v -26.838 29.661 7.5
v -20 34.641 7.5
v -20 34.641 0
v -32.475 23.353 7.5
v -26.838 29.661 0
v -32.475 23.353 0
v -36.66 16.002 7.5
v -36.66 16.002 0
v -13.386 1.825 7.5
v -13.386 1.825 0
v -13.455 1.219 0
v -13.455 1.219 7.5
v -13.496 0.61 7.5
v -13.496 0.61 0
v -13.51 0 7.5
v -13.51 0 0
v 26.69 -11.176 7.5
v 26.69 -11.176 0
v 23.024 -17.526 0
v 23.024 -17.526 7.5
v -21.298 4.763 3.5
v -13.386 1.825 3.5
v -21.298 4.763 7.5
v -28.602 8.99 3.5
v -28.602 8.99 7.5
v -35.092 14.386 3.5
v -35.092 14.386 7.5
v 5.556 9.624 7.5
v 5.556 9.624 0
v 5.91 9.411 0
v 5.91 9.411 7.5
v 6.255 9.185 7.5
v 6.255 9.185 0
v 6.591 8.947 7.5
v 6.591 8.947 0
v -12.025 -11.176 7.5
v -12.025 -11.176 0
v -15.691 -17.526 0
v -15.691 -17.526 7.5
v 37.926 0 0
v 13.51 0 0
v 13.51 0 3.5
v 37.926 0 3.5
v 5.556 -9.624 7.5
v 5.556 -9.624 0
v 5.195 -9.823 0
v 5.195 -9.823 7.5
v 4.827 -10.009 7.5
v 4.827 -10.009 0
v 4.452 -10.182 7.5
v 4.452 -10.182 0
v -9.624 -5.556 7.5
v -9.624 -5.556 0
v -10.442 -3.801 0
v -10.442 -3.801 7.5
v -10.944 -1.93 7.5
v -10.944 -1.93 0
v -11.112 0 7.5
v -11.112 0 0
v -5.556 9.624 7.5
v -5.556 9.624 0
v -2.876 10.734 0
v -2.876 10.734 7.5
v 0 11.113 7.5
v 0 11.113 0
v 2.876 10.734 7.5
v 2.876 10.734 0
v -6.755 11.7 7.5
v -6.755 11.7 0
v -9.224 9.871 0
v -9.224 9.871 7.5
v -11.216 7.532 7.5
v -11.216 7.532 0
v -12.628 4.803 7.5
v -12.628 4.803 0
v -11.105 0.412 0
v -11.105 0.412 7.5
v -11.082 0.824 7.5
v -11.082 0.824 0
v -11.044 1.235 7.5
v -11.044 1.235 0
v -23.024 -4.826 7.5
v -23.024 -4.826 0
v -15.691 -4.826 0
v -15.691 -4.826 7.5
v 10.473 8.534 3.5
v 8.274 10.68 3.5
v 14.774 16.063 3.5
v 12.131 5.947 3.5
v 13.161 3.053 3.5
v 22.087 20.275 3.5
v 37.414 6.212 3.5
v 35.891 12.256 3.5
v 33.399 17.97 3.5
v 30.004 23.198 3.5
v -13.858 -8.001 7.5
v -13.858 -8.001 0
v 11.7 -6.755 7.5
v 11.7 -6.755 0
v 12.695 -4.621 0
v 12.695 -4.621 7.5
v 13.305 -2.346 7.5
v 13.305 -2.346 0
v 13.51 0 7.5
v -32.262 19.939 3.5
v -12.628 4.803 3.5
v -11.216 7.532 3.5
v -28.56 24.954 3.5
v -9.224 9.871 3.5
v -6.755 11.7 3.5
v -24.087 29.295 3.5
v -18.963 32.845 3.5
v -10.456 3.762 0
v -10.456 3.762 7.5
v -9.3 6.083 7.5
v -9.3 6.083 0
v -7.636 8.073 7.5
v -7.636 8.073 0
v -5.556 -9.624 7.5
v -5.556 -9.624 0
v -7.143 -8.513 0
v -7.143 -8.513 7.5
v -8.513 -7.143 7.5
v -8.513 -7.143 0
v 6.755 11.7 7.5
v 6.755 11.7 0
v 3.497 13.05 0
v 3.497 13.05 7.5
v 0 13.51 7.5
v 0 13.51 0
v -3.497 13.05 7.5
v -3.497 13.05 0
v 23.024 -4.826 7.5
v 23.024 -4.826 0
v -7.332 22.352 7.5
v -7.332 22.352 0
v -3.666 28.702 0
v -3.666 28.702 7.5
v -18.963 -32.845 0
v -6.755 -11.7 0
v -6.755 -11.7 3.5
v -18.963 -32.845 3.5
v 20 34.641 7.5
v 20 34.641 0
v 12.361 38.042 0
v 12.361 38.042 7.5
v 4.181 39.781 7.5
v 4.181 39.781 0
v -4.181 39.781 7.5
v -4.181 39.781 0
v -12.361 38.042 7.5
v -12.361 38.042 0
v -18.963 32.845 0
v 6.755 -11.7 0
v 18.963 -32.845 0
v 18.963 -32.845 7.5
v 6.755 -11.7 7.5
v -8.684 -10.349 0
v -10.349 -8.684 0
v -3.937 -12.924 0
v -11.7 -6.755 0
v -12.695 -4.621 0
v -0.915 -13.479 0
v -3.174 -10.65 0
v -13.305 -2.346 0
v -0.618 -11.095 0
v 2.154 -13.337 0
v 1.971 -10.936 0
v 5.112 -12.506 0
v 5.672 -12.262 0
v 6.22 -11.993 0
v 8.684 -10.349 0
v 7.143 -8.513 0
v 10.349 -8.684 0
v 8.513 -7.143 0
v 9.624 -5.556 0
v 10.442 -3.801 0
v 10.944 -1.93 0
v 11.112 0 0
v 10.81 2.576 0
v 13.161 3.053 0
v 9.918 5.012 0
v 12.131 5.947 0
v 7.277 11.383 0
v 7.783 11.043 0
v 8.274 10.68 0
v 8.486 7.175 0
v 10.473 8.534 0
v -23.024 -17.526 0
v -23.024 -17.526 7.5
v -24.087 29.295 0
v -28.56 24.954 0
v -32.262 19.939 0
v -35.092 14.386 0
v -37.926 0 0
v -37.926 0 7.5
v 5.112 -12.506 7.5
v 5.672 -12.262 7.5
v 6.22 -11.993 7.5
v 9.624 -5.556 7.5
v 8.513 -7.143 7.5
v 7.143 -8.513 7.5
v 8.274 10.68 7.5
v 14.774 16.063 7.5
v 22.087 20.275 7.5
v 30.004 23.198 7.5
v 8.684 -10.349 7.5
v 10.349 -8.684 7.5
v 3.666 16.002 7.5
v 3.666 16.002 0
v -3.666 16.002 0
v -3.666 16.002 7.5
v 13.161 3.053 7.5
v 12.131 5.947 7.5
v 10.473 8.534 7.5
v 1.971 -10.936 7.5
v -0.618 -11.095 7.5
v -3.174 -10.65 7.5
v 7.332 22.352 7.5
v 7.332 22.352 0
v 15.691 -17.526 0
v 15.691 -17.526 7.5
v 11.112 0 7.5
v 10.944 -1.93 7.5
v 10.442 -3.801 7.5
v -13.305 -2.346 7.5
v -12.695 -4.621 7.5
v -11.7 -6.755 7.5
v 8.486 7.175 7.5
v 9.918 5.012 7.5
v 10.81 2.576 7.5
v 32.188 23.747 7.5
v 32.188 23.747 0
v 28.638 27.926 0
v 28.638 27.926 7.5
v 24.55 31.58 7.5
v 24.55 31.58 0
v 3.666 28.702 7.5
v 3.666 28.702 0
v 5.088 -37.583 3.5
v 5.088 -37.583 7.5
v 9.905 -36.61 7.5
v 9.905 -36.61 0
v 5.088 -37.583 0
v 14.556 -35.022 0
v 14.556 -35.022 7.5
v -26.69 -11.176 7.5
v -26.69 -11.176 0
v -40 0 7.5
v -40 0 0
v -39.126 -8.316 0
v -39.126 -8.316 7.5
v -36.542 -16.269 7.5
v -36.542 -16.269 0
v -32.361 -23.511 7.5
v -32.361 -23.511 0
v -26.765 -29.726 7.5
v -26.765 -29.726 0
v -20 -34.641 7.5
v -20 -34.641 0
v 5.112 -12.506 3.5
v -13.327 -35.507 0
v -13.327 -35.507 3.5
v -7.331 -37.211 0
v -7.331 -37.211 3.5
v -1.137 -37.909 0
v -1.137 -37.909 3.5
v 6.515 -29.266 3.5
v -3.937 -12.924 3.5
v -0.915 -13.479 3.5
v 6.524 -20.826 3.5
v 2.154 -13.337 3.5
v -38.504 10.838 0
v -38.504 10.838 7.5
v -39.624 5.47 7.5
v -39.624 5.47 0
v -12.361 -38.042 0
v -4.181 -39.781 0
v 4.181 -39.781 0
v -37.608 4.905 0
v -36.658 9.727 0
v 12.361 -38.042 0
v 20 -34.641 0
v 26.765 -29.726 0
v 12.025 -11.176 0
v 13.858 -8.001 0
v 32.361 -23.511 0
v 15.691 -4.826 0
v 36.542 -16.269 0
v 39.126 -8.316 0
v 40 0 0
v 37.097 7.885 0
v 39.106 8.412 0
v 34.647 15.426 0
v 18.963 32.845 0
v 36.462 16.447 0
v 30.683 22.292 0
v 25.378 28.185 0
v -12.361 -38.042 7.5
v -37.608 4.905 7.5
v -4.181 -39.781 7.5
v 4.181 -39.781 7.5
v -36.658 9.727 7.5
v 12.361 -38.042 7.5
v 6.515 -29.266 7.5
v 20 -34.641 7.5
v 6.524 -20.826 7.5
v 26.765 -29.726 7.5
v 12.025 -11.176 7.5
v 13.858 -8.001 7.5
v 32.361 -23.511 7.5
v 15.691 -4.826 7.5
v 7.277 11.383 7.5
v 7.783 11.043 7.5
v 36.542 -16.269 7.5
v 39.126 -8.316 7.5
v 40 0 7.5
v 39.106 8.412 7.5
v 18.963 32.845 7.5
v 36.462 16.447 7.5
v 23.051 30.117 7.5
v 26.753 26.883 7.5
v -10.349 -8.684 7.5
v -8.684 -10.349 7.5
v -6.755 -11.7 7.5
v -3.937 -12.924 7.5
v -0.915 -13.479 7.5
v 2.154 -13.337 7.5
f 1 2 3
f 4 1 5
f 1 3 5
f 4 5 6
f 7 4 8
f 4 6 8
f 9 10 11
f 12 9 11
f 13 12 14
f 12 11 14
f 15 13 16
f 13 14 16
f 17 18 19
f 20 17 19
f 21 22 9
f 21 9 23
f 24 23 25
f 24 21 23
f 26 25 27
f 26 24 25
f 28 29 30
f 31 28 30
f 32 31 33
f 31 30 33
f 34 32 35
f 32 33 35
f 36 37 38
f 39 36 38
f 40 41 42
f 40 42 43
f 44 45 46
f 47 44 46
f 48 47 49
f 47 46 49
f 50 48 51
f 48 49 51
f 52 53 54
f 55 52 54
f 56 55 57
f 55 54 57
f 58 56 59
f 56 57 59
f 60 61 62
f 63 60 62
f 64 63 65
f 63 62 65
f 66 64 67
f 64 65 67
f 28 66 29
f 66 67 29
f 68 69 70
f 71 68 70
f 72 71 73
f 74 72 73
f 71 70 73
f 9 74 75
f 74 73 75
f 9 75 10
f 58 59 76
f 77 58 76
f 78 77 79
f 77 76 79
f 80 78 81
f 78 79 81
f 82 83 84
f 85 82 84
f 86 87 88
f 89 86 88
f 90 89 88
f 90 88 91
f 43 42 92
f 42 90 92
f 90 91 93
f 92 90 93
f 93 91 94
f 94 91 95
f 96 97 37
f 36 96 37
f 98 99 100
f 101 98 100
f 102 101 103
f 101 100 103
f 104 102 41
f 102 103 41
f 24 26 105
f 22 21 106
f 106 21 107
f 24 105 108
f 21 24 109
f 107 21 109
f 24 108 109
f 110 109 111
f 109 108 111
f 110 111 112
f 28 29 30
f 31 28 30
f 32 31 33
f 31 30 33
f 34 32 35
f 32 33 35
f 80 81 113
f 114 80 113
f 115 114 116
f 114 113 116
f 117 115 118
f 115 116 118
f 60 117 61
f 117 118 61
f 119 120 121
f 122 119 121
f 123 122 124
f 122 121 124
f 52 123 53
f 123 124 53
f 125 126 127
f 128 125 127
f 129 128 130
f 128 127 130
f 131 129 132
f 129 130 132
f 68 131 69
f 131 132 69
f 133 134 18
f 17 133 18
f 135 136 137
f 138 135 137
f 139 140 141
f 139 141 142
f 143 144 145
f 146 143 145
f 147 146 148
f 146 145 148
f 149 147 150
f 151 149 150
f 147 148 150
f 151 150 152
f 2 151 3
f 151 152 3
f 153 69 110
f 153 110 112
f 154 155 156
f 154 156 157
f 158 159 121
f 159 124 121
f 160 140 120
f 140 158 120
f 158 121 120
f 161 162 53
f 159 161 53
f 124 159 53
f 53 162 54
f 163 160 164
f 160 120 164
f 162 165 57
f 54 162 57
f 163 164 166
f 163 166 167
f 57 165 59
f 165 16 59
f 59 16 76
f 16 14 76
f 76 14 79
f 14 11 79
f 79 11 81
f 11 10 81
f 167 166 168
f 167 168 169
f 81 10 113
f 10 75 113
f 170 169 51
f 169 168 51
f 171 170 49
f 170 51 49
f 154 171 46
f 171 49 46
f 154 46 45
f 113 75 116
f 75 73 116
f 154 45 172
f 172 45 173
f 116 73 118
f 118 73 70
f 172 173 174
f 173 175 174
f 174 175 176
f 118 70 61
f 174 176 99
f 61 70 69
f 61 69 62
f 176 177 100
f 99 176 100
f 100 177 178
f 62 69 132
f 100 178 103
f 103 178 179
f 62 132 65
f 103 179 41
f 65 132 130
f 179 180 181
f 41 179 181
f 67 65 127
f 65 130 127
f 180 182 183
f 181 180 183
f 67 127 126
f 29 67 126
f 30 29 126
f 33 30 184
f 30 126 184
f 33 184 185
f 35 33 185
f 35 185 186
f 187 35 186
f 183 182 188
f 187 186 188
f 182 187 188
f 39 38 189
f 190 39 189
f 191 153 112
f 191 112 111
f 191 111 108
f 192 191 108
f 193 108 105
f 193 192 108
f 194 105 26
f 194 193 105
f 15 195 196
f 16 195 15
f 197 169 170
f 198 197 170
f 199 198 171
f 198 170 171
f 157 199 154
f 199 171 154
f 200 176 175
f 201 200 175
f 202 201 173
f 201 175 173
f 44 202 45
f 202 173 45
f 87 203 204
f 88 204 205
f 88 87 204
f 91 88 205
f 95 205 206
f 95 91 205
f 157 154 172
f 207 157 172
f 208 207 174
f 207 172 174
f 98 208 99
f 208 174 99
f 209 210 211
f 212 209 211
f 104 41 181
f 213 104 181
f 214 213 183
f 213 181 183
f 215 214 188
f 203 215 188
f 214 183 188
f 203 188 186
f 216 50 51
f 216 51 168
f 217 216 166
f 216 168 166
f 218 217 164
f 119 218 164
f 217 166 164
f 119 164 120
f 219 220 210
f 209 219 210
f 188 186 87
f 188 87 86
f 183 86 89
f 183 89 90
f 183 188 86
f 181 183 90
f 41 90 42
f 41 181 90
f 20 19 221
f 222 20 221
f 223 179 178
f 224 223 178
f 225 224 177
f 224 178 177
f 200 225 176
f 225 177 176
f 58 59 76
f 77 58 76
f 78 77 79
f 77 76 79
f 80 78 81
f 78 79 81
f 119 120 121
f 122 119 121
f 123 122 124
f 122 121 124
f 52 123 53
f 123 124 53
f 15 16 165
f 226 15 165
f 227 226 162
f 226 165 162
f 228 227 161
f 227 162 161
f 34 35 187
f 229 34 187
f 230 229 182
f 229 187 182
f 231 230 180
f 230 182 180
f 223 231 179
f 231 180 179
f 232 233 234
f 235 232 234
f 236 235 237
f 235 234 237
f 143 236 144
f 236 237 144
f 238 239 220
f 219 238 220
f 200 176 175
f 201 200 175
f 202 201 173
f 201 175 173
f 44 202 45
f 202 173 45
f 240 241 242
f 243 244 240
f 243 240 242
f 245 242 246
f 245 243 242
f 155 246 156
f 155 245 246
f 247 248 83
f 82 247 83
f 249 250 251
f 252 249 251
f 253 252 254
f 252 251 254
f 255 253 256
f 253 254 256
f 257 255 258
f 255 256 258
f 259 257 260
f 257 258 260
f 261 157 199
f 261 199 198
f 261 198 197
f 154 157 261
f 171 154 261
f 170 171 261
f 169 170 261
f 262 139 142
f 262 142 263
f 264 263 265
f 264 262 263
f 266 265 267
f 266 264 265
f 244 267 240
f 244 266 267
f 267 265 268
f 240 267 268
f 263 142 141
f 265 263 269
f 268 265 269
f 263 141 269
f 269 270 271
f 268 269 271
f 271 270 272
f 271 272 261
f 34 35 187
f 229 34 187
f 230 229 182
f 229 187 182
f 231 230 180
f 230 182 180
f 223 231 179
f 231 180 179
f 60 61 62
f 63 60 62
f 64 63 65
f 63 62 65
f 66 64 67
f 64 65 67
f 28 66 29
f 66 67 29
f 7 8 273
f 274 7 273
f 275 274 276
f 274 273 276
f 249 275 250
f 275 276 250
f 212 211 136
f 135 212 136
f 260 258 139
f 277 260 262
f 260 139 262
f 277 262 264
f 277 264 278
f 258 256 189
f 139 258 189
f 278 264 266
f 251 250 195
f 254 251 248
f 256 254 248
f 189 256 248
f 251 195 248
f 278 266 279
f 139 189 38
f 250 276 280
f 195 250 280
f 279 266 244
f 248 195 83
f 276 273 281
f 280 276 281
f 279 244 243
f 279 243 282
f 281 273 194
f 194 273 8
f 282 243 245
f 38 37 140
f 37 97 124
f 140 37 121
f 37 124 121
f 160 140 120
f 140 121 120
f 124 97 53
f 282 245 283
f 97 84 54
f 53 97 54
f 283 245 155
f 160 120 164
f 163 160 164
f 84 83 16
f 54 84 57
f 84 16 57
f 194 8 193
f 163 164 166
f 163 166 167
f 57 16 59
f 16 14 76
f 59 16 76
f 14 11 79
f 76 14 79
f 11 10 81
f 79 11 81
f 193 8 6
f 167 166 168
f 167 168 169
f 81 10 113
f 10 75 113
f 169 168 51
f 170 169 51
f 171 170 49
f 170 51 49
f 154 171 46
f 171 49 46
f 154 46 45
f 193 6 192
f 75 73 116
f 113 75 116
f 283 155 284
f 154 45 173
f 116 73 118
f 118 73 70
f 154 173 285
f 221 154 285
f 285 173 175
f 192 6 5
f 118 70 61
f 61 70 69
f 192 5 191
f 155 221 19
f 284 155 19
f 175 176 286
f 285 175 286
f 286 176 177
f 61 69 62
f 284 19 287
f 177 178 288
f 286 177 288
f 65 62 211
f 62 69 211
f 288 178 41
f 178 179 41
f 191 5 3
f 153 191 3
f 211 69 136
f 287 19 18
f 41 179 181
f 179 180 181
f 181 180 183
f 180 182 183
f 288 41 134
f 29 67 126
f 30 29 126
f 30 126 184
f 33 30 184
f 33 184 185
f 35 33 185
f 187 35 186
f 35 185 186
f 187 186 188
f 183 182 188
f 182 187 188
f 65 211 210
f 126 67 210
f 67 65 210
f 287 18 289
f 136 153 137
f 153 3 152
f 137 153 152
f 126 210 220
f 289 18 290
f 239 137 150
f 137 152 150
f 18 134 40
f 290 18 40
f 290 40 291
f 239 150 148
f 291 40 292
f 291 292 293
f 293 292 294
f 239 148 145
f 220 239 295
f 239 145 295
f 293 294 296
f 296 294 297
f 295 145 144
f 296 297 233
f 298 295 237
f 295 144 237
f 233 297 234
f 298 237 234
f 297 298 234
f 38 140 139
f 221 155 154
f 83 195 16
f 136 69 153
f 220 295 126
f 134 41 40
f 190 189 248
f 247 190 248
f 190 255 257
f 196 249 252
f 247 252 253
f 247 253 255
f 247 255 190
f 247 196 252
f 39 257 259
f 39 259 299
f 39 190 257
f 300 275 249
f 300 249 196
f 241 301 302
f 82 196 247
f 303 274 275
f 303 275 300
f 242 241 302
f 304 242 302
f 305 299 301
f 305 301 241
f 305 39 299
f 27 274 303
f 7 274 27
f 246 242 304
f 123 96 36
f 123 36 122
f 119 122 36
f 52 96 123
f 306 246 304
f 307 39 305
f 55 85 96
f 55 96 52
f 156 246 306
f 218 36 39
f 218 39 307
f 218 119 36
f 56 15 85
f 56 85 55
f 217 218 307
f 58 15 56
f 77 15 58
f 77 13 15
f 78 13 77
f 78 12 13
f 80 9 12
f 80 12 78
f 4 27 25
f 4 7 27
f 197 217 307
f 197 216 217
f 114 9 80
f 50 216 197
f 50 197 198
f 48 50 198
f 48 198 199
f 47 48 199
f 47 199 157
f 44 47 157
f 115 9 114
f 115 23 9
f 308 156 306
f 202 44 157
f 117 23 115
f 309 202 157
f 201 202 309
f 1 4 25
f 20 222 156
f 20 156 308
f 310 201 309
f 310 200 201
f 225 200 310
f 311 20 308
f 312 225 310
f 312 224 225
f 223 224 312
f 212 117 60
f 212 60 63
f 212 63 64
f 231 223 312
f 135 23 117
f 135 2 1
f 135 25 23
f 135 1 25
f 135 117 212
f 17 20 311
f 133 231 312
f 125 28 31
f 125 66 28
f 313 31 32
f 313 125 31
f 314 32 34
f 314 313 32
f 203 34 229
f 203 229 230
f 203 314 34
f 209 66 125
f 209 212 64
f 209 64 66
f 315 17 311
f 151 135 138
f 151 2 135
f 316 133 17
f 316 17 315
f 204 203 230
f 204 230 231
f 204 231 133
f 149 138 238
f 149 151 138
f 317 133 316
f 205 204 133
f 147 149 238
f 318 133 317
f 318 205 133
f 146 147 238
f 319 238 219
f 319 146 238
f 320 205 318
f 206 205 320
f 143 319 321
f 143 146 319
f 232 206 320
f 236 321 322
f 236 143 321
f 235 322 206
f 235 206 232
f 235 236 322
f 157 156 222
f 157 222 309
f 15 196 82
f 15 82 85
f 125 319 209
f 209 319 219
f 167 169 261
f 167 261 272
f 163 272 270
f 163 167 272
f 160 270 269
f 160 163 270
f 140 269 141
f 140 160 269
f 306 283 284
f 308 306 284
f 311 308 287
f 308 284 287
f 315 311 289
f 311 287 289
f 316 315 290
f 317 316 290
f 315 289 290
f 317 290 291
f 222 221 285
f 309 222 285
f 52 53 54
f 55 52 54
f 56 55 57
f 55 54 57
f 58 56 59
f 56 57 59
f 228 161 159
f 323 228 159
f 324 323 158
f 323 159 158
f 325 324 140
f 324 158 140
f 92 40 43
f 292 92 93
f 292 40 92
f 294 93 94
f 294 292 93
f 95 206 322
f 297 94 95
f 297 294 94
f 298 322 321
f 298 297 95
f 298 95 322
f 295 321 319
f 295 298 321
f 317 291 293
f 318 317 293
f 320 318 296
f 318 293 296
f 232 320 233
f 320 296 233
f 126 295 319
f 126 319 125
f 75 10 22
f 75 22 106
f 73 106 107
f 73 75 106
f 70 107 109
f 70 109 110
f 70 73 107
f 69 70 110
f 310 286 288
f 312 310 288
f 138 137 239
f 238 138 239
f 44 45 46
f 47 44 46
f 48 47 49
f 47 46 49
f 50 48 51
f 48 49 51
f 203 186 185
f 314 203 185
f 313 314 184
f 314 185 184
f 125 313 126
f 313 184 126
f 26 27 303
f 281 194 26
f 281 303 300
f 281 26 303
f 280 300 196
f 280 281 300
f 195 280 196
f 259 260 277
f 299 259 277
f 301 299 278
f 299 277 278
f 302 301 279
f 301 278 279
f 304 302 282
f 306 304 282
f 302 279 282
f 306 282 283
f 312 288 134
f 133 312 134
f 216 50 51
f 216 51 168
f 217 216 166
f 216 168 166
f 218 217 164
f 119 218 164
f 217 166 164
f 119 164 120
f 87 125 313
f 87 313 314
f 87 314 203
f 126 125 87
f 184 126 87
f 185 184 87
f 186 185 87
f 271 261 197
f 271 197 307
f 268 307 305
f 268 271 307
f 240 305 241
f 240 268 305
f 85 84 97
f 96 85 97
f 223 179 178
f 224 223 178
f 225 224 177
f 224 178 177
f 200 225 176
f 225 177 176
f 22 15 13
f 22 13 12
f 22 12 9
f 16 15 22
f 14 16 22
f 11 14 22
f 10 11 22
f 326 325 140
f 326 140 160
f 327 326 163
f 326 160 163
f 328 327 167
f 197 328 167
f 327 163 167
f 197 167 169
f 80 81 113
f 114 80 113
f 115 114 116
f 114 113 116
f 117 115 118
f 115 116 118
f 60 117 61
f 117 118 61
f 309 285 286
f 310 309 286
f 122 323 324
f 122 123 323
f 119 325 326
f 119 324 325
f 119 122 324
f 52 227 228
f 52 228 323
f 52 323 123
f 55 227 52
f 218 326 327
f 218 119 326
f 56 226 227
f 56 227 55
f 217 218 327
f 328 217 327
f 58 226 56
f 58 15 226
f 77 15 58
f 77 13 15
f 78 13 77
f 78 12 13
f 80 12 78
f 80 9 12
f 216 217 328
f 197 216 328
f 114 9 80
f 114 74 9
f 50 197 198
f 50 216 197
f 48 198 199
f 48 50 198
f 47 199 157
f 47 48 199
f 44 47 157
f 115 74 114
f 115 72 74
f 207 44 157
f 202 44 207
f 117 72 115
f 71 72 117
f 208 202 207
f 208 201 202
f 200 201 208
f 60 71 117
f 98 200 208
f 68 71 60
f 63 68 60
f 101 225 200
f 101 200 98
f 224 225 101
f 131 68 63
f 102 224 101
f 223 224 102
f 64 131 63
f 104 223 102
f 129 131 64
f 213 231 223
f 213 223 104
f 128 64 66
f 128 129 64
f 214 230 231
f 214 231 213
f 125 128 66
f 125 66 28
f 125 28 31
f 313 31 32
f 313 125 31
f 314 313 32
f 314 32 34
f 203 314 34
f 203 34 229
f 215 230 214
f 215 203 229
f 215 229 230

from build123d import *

# Parameters (mm, degrees)
F1_DEPTH = 7.5
F2_DEPTH = 3.25
F3_DEPTH = 25
F4_DEPTH = 7.5
F5_DEPTH = 7.5
F6_DEPTH = 25
F7_DEPTH = 3.5


with BuildPart() as f1:
    # F0 (on Top) → F1 (new body)
    with BuildSketch(Plane.XY):
        with BuildLine():
            Line((37.9261646969, 0), (40, 0))
            ThreePointArc((40, 0), (37.9968389168, 12.4996092872), (32.1879883833, 23.7472820305))
            ThreePointArc((32.1879883833, 23.7472820305), (31.0930850061, 23.4847690882), (30.0043711026, 23.1976654721))
            ThreePointArc((30.0043711026, 23.1976654721), (35.8911179032, 12.2564931476), (37.9261646969, 0))
        make_face()
        with BuildLine():
            ThreePointArc((20, -34.6410161514), (34.6410161514, -20), (40, 0))
            Line((40, 0), (37.9261646969, 0))
            ThreePointArc((37.9261646969, 0), (32.8450220956, -18.9630823485), (18.9630823485, -32.8450220956))
            Line((18.9630823485, -32.8450220956), (20, -34.6410161514))
        make_face()
        with BuildLine():
            ThreePointArc((30.0043711026, 23.1976654721), (31.0930850061, 23.4847690882), (32.1879883833, 23.7472820305))
            ThreePointArc((32.1879883833, 23.7472820305), (26.6564231218, 29.8233986385), (20, 34.6410161514))
            Line((20, 34.6410161514), (18.9630823485, 32.8450220956))
            ThreePointArc((18.9630823485, 32.8450220956), (24.9543733006, 28.5599933787), (30.0043711026, 23.1976654721))
        make_face()
        with BuildLine():
            ThreePointArc((4.4717553176, -39.7492566519), (12.4996092872, -37.9968389168), (20, -34.6410161514))
            Line((20, -34.6410161514), (18.9630823485, -32.8450220956))
            ThreePointArc((18.9630823485, -32.8450220956), (12.2564931476, -35.8911179032), (5.087582056, -37.5833803355))
            ThreePointArc((5.087582056, -37.5833803355), (4.7918641293, -38.6697860415), (4.4717553176, -39.7492566519))
        make_face()
        with BuildLine():
            Line((18.9630823485, 32.8450220956), (20, 34.6410161514))
            ThreePointArc((20, 34.6410161514), (0, 40), (-20, 34.6410161514))
            Line((-20, 34.6410161514), (-18.9630823485, 32.8450220956))
            ThreePointArc((-18.9630823485, 32.8450220956), (0, 37.9261646969), (18.9630823485, 32.8450220956))
        make_face()
        with BuildLine():
            ThreePointArc((-20, -34.6410161514), (-8.1734402782, -39.156032409), (4.4717553176, -39.7492566519))
            ThreePointArc((4.4717553176, -39.7492566519), (4.7918641293, -38.6697860415), (5.087582056, -37.5833803355))
            ThreePointArc((5.087582056, -37.5833803355), (-7.3311245245, -37.2108664482), (-18.9630823485, -32.8450220956))
            Line((-18.9630823485, -32.8450220956), (-20, -34.6410161514))
        make_face()
        with BuildLine():
            Line((-18.9630823485, 32.8450220956), (-20, 34.6410161514))
            ThreePointArc((-20, 34.6410161514), (-29.8233986385, 26.6564231218), (-36.6597437009, 16.0019746214))
            ThreePointArc((-36.6597437009, 16.0019746214), (-35.8849491355, 15.1850169532), (-35.0919531586, 14.3857148634))
            ThreePointArc((-35.0919531586, 14.3857148634), (-28.5599933787, 24.9543733006), (-18.9630823485, 32.8450220956))
        make_face()
        with BuildLine():
            ThreePointArc((-40, 0), (-34.6410161514, -20), (-20, -34.6410161514))
            Line((-20, -34.6410161514), (-18.9630823485, -32.8450220956))
            ThreePointArc((-18.9630823485, -32.8450220956), (-32.8450220956, -18.9630823485), (-37.9261646969, 0))
            Line((-37.9261646969, 0), (-40, 0))
        make_face()
        with BuildLine():
            ThreePointArc((-35.0919531586, 14.3857148634), (-35.8849491355, 15.1850169532), (-36.6597437009, 16.0019746214))
            ThreePointArc((-36.6597437009, 16.0019746214), (-39.156032409, 8.1734402782), (-40, 0))
            Line((-40, 0), (-37.9261646969, 0))
            ThreePointArc((-37.9261646969, 0), (-37.2108664482, 7.3311245245), (-35.0919531586, 14.3857148634))
        make_face()
        with BuildLine():
            ThreePointArc((-37.9261646969, 0), (-32.8450220956, -18.9630823485), (-18.9630823485, -32.8450220956))
            Line((-18.9630823485, -32.8450220956), (-6.7550944326, -11.7001667673))
            ThreePointArc((-6.7550944326, -11.7001667673), (-9.5531461618, -9.5531461618), (-11.7001667673, -6.7550944326))
            ThreePointArc((-11.7001667673, -6.7550944326), (-13.049840343, -3.4966941813), (-13.5101888653, 0))
            Line((-13.5101888653, 0), (-37.9261646969, 0))
        make_face()
        Polygon((-15.6912036375, -4.8259873107), (-13.8581165329, -8.0009873107), (-12.0250294282, -11.1759873107), (-15.6912036375, -17.5259873107), (-23.0235520562, -17.5259873107), (-26.6897262656, -11.1759873107), (-23.0235520562, -4.8259873107), align=None, mode=Mode.SUBTRACT)
        with BuildLine():
            ThreePointArc((-18.9630823485, -32.8450220956), (-7.3311245245, -37.2108664482), (5.087582056, -37.5833803355))
            ThreePointArc((5.087582056, -37.5833803355), (6.6978790363, -25.0460653274), (5.112236707, -12.505608303))
            ThreePointArc((5.112236707, -12.505608303), (-0.9148384522, -13.4791792696), (-6.7550944326, -11.7001667673))
            Line((-6.7550944326, -11.7001667673), (-18.9630823485, -32.8450220956))
        make_face()
        with BuildLine():
            ThreePointArc((5.087582056, -37.5833803355), (12.2564931476, -35.8911179032), (18.9630823485, -32.8450220956))
            Line((18.9630823485, -32.8450220956), (6.7550944326, -11.7001667673))
            ThreePointArc((6.7550944326, -11.7001667673), (5.9473162949, -12.1307308957), (5.112236707, -12.505608303))
            ThreePointArc((5.112236707, -12.505608303), (6.6978790363, -25.0460653274), (5.087582056, -37.5833803355))
        make_face()
        with BuildLine():
            ThreePointArc((18.9630823485, -32.8450220956), (32.8450220956, -18.9630823485), (37.9261646969, 0))
            Line((37.9261646969, 0), (13.5101888653, 0))
            ThreePointArc((13.5101888653, 0), (13.049840343, -3.4966941813), (11.7001667673, -6.7550944326))
            ThreePointArc((11.7001667673, -6.7550944326), (9.5531461618, -9.5531461618), (6.7550944326, -11.7001667673))
            Line((6.7550944326, -11.7001667673), (18.9630823485, -32.8450220956))
        make_face()
        Polygon((12.0250294282, -11.1759873107), (13.8581165329, -8.0009873107), (15.6912036375, -4.8259873107), (23.0235520562, -4.8259873107), (26.6897262656, -11.1759873107), (23.0235520562, -17.5259873107), (15.6912036375, -17.5259873107), align=None, mode=Mode.SUBTRACT)
        with BuildLine():
            ThreePointArc((-11.7001667673, -6.7550944326), (-9.5531461618, -9.5531461618), (-6.7550944326, -11.7001667673))
            Line((-6.7550944326, -11.7001667673), (-5.55625, -9.6237072996))
            ThreePointArc((-5.55625, -9.6237072996), (-7.8577241059, -7.8577241059), (-9.6237072996, -5.55625))
            Line((-9.6237072996, -5.55625), (-11.7001667673, -6.7550944326))
        make_face()
        with BuildLine():
            ThreePointArc((-9.6237072996, -5.55625), (-10.7338507446, -2.8761266387), (-11.1125, 0))
            Line((-11.1125, 0), (-13.5101888653, 0))
            ThreePointArc((-13.5101888653, 0), (-13.049840343, -3.4966941813), (-11.7001667673, -6.7550944326))
            Line((-11.7001667673, -6.7550944326), (-9.6237072996, -5.55625))
        make_face()
        with BuildLine():
            Line((-5.55625, 9.6237072996), (-6.7550944326, 11.7001667673))
            ThreePointArc((-6.7550944326, 11.7001667673), (-11.2158924436, 7.5318629748), (-13.3862928336, 1.8254772931))
            ThreePointArc((-13.3862928336, 1.8254772931), (-12.2185420326, 1.5161003824), (-11.0436569899, 1.2350289634))
            ThreePointArc((-11.0436569899, 1.2350289634), (-9.2995542407, 6.0832513654), (-5.55625, 9.6237072996))
        make_face()
        with BuildLine():
            ThreePointArc((-13.3862928336, 1.8254772931), (-25.0394683565, 6.7224992667), (-35.0919531586, 14.3857148634))
            ThreePointArc((-35.0919531586, 14.3857148634), (-37.2108664482, 7.3311245245), (-37.9261646969, 0))
            Line((-37.9261646969, 0), (-13.5101888653, 0))
            ThreePointArc((-13.5101888653, 0), (-13.4791792696, 0.9148384522), (-13.3862928336, 1.8254772931))
        make_face()
        with BuildLine():
            Line((-6.7550944326, 11.7001667673), (-18.9630823485, 32.8450220956))
            ThreePointArc((-18.9630823485, 32.8450220956), (-28.5599933787, 24.9543733006), (-35.0919531586, 14.3857148634))
            ThreePointArc((-35.0919531586, 14.3857148634), (-25.0394683565, 6.7224992667), (-13.3862928336, 1.8254772931))
            ThreePointArc((-13.3862928336, 1.8254772931), (-11.2158924436, 7.5318629748), (-6.7550944326, 11.7001667673))
        make_face()
        with BuildLine():
            Line((6.7550944326, 11.7001667673), (18.9630823485, 32.8450220956))
            ThreePointArc((18.9630823485, 32.8450220956), (0, 37.9261646969), (-18.9630823485, 32.8450220956))
            Line((-18.9630823485, 32.8450220956), (-6.7550944326, 11.7001667673))
            ThreePointArc((-6.7550944326, 11.7001667673), (0, 13.5101888653), (6.7550944326, 11.7001667673))
        make_face()
        Polygon((7.3323484187, 22.3519746214), (3.6661742094, 16.0019746214), (-3.6661742094, 16.0019746214), (-7.3323484187, 22.3519746214), (-3.6661742094, 28.7019746214), (3.6661742094, 28.7019746214), align=None, mode=Mode.SUBTRACT)
        with BuildLine():
            Line((5.55625, 9.6237072996), (6.7550944326, 11.7001667673))
            ThreePointArc((6.7550944326, 11.7001667673), (0, 13.5101888653), (-6.7550944326, 11.7001667673))
            Line((-6.7550944326, 11.7001667673), (-5.55625, 9.6237072996))
            ThreePointArc((-5.55625, 9.6237072996), (0, 11.1125), (5.55625, 9.6237072996))
        make_face()
        with BuildLine():
            Line((-13.5101888653, 0), (-11.1125, 0))
            ThreePointArc((-11.1125, 0), (-11.095275899, 0.6184730997), (-11.0436569899, 1.2350289634))
            ThreePointArc((-11.0436569899, 1.2350289634), (-12.2185420326, 1.5161003824), (-13.3862928336, 1.8254772931))
            ThreePointArc((-13.3862928336, 1.8254772931), (-13.4791792696, 0.9148384522), (-13.5101888653, 0))
        make_face()
        with BuildLine():
            Line((11.1125, 0), (13.5101888653, 0))
            ThreePointArc((13.5101888653, 0), (12.1307308957, 5.9473162949), (8.2740561267, 10.6801310099))
            ThreePointArc((8.2740561267, 10.6801310099), (7.4222524621, 9.8235176062), (6.5913949516, 8.9465730222))
            ThreePointArc((6.5913949516, 8.9465730222), (9.9180273404, 5.0120245336), (11.1125, 0))
        make_face()
        with BuildLine():
            ThreePointArc((6.5913949516, 8.9465730222), (7.4222524621, 9.8235176062), (8.2740561267, 10.6801310099))
            ThreePointArc((8.2740561267, 10.6801310099), (7.5318629748, 11.2158924436), (6.7550944326, 11.7001667673))
            Line((6.7550944326, 11.7001667673), (5.55625, 9.6237072996))
            ThreePointArc((5.55625, 9.6237072996), (6.0832513654, 9.2995542407), (6.5913949516, 8.9465730222))
        make_face()
        with BuildLine():
            Line((5.55625, -9.6237072996), (6.7550944326, -11.7001667673))
            ThreePointArc((6.7550944326, -11.7001667673), (9.5531461618, -9.5531461618), (11.7001667673, -6.7550944326))
            Line((11.7001667673, -6.7550944326), (9.6237072996, -5.55625))
            ThreePointArc((9.6237072996, -5.55625), (7.8577241059, -7.8577241059), (5.55625, -9.6237072996))
        make_face()
        with BuildLine():
            ThreePointArc((11.7001667673, -6.7550944326), (13.049840343, -3.4966941813), (13.5101888653, 0))
            Line((13.5101888653, 0), (11.1125, 0))
            ThreePointArc((11.1125, 0), (10.7338507446, -2.8761266387), (9.6237072996, -5.55625))
            Line((9.6237072996, -5.55625), (11.7001667673, -6.7550944326))
        make_face()
        with BuildLine():
            ThreePointArc((5.112236707, -12.505608303), (5.9473162949, -12.1307308957), (6.7550944326, -11.7001667673))
            Line((6.7550944326, -11.7001667673), (5.55625, -9.6237072996))
            ThreePointArc((5.55625, -9.6237072996), (5.0120245336, -9.9180273404), (4.4522620383, -10.1816019856))
            ThreePointArc((4.4522620383, -10.1816019856), (4.7962895705, -11.3396179886), (5.112236707, -12.505608303))
        make_face()
        with BuildLine():
            ThreePointArc((-6.7550944326, -11.7001667673), (-0.9148384522, -13.4791792696), (5.112236707, -12.505608303))
            ThreePointArc((5.112236707, -12.505608303), (4.7962895705, -11.3396179886), (4.4522620383, -10.1816019856))
            ThreePointArc((4.4522620383, -10.1816019856), (-0.6184730997, -11.095275899), (-5.55625, -9.6237072996))
            Line((-5.55625, -9.6237072996), (-6.7550944326, -11.7001667673))
        make_face()
        with BuildLine():
            Line((13.5101888653, 0), (37.9261646969, 0))
            ThreePointArc((37.9261646969, 0), (35.8911179032, 12.2564931476), (30.0043711026, 23.1976654721))
            ThreePointArc((30.0043711026, 23.1976654721), (18.3415893202, 18.3235660606), (8.2740561267, 10.6801310099))
            ThreePointArc((8.2740561267, 10.6801310099), (12.1307308957, 5.9473162949), (13.5101888653, 0))
        make_face()
        with BuildLine():
            ThreePointArc((8.2740561267, 10.6801310099), (18.3415893202, 18.3235660606), (30.0043711026, 23.1976654721))
            ThreePointArc((30.0043711026, 23.1976654721), (24.9543733006, 28.5599933787), (18.9630823485, 32.8450220956))
            Line((18.9630823485, 32.8450220956), (6.7550944326, 11.7001667673))
            ThreePointArc((6.7550944326, 11.7001667673), (7.5318629748, 11.2158924436), (8.2740561267, 10.6801310099))
        make_face()
    extrude(amount=F1_DEPTH)

    # F0 (on Top) → F2 (cut)
    with BuildSketch(Plane.XY):
        with BuildLine():
            Line((-18.9630823485, 32.8450220956), (-20, 34.6410161514))
            ThreePointArc((-20, 34.6410161514), (-29.8233986385, 26.6564231218), (-36.6597437009, 16.0019746214))
            ThreePointArc((-36.6597437009, 16.0019746214), (-35.8849491355, 15.1850169532), (-35.0919531586, 14.3857148634))
            ThreePointArc((-35.0919531586, 14.3857148634), (-28.5599933787, 24.9543733006), (-18.9630823485, 32.8450220956))
        make_face()
        with BuildLine():
            ThreePointArc((-20, -34.6410161514), (-8.1734402782, -39.156032409), (4.4717553176, -39.7492566519))
            ThreePointArc((4.4717553176, -39.7492566519), (4.7918641293, -38.6697860415), (5.087582056, -37.5833803355))
            ThreePointArc((5.087582056, -37.5833803355), (-7.3311245245, -37.2108664482), (-18.9630823485, -32.8450220956))
            Line((-18.9630823485, -32.8450220956), (-20, -34.6410161514))
        make_face()
        with BuildLine():
            Line((37.9261646969, 0), (40, 0))
            ThreePointArc((40, 0), (37.9968389168, 12.4996092872), (32.1879883833, 23.7472820305))
            ThreePointArc((32.1879883833, 23.7472820305), (31.0930850061, 23.4847690882), (30.0043711026, 23.1976654721))
            ThreePointArc((30.0043711026, 23.1976654721), (35.8911179032, 12.2564931476), (37.9261646969, 0))
        make_face()
    extrude(amount=F2_DEPTH, mode=Mode.SUBTRACT)

    # F0 (on Top) → F3 (cut)
    with BuildSketch(Plane.XY):
        with BuildLine():
            ThreePointArc((-35.0919531586, 14.3857148634), (-35.8849491355, 15.1850169532), (-36.6597437009, 16.0019746214))
            ThreePointArc((-36.6597437009, 16.0019746214), (-39.156032409, 8.1734402782), (-40, 0))
            Line((-40, 0), (-37.9261646969, 0))
            ThreePointArc((-37.9261646969, 0), (-37.2108664482, 7.3311245245), (-35.0919531586, 14.3857148634))
        make_face()
        with BuildLine():
            ThreePointArc((30.0043711026, 23.1976654721), (31.0930850061, 23.4847690882), (32.1879883833, 23.7472820305))
            ThreePointArc((32.1879883833, 23.7472820305), (26.6564231218, 29.8233986385), (20, 34.6410161514))
            Line((20, 34.6410161514), (18.9630823485, 32.8450220956))
            ThreePointArc((18.9630823485, 32.8450220956), (24.9543733006, 28.5599933787), (30.0043711026, 23.1976654721))
        make_face()
        with BuildLine():
            ThreePointArc((4.4717553176, -39.7492566519), (12.4996092872, -37.9968389168), (20, -34.6410161514))
            Line((20, -34.6410161514), (18.9630823485, -32.8450220956))
            ThreePointArc((18.9630823485, -32.8450220956), (12.2564931476, -35.8911179032), (5.087582056, -37.5833803355))
            ThreePointArc((5.087582056, -37.5833803355), (4.7918641293, -38.6697860415), (4.4717553176, -39.7492566519))
        make_face()
    extrude(amount=F3_DEPTH, mode=Mode.SUBTRACT)

    # F0 (on Top) → F5 (join)
    with BuildSketch(Plane.XY):
        with BuildLine():
            ThreePointArc((-35.0919531586, 14.3857148634), (-35.8849491355, 15.1850169532), (-36.6597437009, 16.0019746214))
            ThreePointArc((-36.6597437009, 16.0019746214), (-39.156032409, 8.1734402782), (-40, 0))
            Line((-40, 0), (-37.9261646969, 0))
            ThreePointArc((-37.9261646969, 0), (-37.2108664482, 7.3311245245), (-35.0919531586, 14.3857148634))
        make_face()
        with BuildLine():
            Line((-18.9630823485, 32.8450220956), (-20, 34.6410161514))
            ThreePointArc((-20, 34.6410161514), (-29.8233986385, 26.6564231218), (-36.6597437009, 16.0019746214))
            ThreePointArc((-36.6597437009, 16.0019746214), (-35.8849491355, 15.1850169532), (-35.0919531586, 14.3857148634))
            ThreePointArc((-35.0919531586, 14.3857148634), (-28.5599933787, 24.9543733006), (-18.9630823485, 32.8450220956))
        make_face()
        with BuildLine():
            ThreePointArc((-40, 0), (-34.6410161514, -20), (-20, -34.6410161514))
            Line((-20, -34.6410161514), (-18.9630823485, -32.8450220956))
            ThreePointArc((-18.9630823485, -32.8450220956), (-32.8450220956, -18.9630823485), (-37.9261646969, 0))
            Line((-37.9261646969, 0), (-40, 0))
        make_face()
        with BuildLine():
            ThreePointArc((-20, -34.6410161514), (-8.1734402782, -39.156032409), (4.4717553176, -39.7492566519))
            ThreePointArc((4.4717553176, -39.7492566519), (4.7918641293, -38.6697860415), (5.087582056, -37.5833803355))
            ThreePointArc((5.087582056, -37.5833803355), (-7.3311245245, -37.2108664482), (-18.9630823485, -32.8450220956))
            Line((-18.9630823485, -32.8450220956), (-20, -34.6410161514))
        make_face()
        with BuildLine():
            ThreePointArc((4.4717553176, -39.7492566519), (12.4996092872, -37.9968389168), (20, -34.6410161514))
            Line((20, -34.6410161514), (18.9630823485, -32.8450220956))
            ThreePointArc((18.9630823485, -32.8450220956), (12.2564931476, -35.8911179032), (5.087582056, -37.5833803355))
            ThreePointArc((5.087582056, -37.5833803355), (4.7918641293, -38.6697860415), (4.4717553176, -39.7492566519))
        make_face()
        with BuildLine():
            ThreePointArc((20, -34.6410161514), (34.6410161514, -20), (40, 0))
            Line((40, 0), (37.9261646969, 0))
            ThreePointArc((37.9261646969, 0), (32.8450220956, -18.9630823485), (18.9630823485, -32.8450220956))
            Line((18.9630823485, -32.8450220956), (20, -34.6410161514))
        make_face()
        with BuildLine():
            Line((37.9261646969, 0), (40, 0))
            ThreePointArc((40, 0), (37.9968389168, 12.4996092872), (32.1879883833, 23.7472820305))
            ThreePointArc((32.1879883833, 23.7472820305), (31.0930850061, 23.4847690882), (30.0043711026, 23.1976654721))
            ThreePointArc((30.0043711026, 23.1976654721), (35.8911179032, 12.2564931476), (37.9261646969, 0))
        make_face()
        with BuildLine():
            ThreePointArc((30.0043711026, 23.1976654721), (31.0930850061, 23.4847690882), (32.1879883833, 23.7472820305))
            ThreePointArc((32.1879883833, 23.7472820305), (26.6564231218, 29.8233986385), (20, 34.6410161514))
            Line((20, 34.6410161514), (18.9630823485, 32.8450220956))
            ThreePointArc((18.9630823485, 32.8450220956), (24.9543733006, 28.5599933787), (30.0043711026, 23.1976654721))
        make_face()
        with BuildLine():
            Line((18.9630823485, 32.8450220956), (20, 34.6410161514))
            ThreePointArc((20, 34.6410161514), (0, 40), (-20, 34.6410161514))
            Line((-20, 34.6410161514), (-18.9630823485, 32.8450220956))
            ThreePointArc((-18.9630823485, 32.8450220956), (0, 37.9261646969), (18.9630823485, 32.8450220956))
        make_face()
    extrude(amount=F5_DEPTH)

    # F0 (on Top) → F6 (cut)
    with BuildSketch(Plane.XY):
        with BuildLine():
            ThreePointArc((5.087582056, -37.5833803355), (12.2564931476, -35.8911179032), (18.9630823485, -32.8450220956))
            Line((18.9630823485, -32.8450220956), (6.7550944326, -11.7001667673))
            ThreePointArc((6.7550944326, -11.7001667673), (5.9473162949, -12.1307308957), (5.112236707, -12.505608303))
            ThreePointArc((5.112236707, -12.505608303), (6.6978790363, -25.0460653274), (5.087582056, -37.5833803355))
        make_face()
        with BuildLine():
            ThreePointArc((-13.3862928336, 1.8254772931), (-25.0394683565, 6.7224992667), (-35.0919531586, 14.3857148634))
            ThreePointArc((-35.0919531586, 14.3857148634), (-37.2108664482, 7.3311245245), (-37.9261646969, 0))
            Line((-37.9261646969, 0), (-13.5101888653, 0))
            ThreePointArc((-13.5101888653, 0), (-13.4791792696, 0.9148384522), (-13.3862928336, 1.8254772931))
        make_face()
        with BuildLine():
            ThreePointArc((8.2740561267, 10.6801310099), (18.3415893202, 18.3235660606), (30.0043711026, 23.1976654721))
            ThreePointArc((30.0043711026, 23.1976654721), (24.9543733006, 28.5599933787), (18.9630823485, 32.8450220956))
            Line((18.9630823485, 32.8450220956), (6.7550944326, 11.7001667673))
            ThreePointArc((6.7550944326, 11.7001667673), (7.5318629748, 11.2158924436), (8.2740561267, 10.6801310099))
        make_face()
    extrude(amount=F6_DEPTH, mode=Mode.SUBTRACT)

    # F0 (on Top) → F7 (cut)
    with BuildSketch(Plane.XY):
        with BuildLine():
            Line((-6.7550944326, 11.7001667673), (-18.9630823485, 32.8450220956))
            ThreePointArc((-18.9630823485, 32.8450220956), (-28.5599933787, 24.9543733006), (-35.0919531586, 14.3857148634))
            ThreePointArc((-35.0919531586, 14.3857148634), (-25.0394683565, 6.7224992667), (-13.3862928336, 1.8254772931))
            ThreePointArc((-13.3862928336, 1.8254772931), (-11.2158924436, 7.5318629748), (-6.7550944326, 11.7001667673))
        make_face()
        with BuildLine():
            Line((13.5101888653, 0), (37.9261646969, 0))
            ThreePointArc((37.9261646969, 0), (35.8911179032, 12.2564931476), (30.0043711026, 23.1976654721))
            ThreePointArc((30.0043711026, 23.1976654721), (18.3415893202, 18.3235660606), (8.2740561267, 10.6801310099))
            ThreePointArc((8.2740561267, 10.6801310099), (12.1307308957, 5.9473162949), (13.5101888653, 0))
        make_face()
        with BuildLine():
            ThreePointArc((-18.9630823485, -32.8450220956), (-7.3311245245, -37.2108664482), (5.087582056, -37.5833803355))
            ThreePointArc((5.087582056, -37.5833803355), (6.6978790363, -25.0460653274), (5.112236707, -12.505608303))
            ThreePointArc((5.112236707, -12.505608303), (-0.9148384522, -13.4791792696), (-6.7550944326, -11.7001667673))
            Line((-6.7550944326, -11.7001667673), (-18.9630823485, -32.8450220956))
        make_face()
    extrude(amount=F7_DEPTH, mode=Mode.SUBTRACT)


with BuildPart() as f4:
    # F0 (on Top) → F4 (new body)
    with BuildSketch(Plane.XY):
        with BuildLine():
            ThreePointArc((-9.6237072996, -5.55625), (-10.7338507446, -2.8761266387), (-11.1125, 0))
            Line((-11.1125, 0), (-13.5101888653, 0))
            ThreePointArc((-13.5101888653, 0), (-13.049840343, -3.4966941813), (-11.7001667673, -6.7550944326))
            Line((-11.7001667673, -6.7550944326), (-9.6237072996, -5.55625))
        make_face()
        with BuildLine():
            Line((-13.5101888653, 0), (-11.1125, 0))
            ThreePointArc((-11.1125, 0), (-11.095275899, 0.6184730997), (-11.0436569899, 1.2350289634))
            ThreePointArc((-11.0436569899, 1.2350289634), (-12.2185420326, 1.5161003824), (-13.3862928336, 1.8254772931))
            ThreePointArc((-13.3862928336, 1.8254772931), (-13.4791792696, 0.9148384522), (-13.5101888653, 0))
        make_face()
        with BuildLine():
            Line((-5.55625, 9.6237072996), (-6.7550944326, 11.7001667673))
            ThreePointArc((-6.7550944326, 11.7001667673), (-11.2158924436, 7.5318629748), (-13.3862928336, 1.8254772931))
            ThreePointArc((-13.3862928336, 1.8254772931), (-12.2185420326, 1.5161003824), (-11.0436569899, 1.2350289634))
            ThreePointArc((-11.0436569899, 1.2350289634), (-9.2995542407, 6.0832513654), (-5.55625, 9.6237072996))
        make_face()
        with BuildLine():
            Line((5.55625, 9.6237072996), (6.7550944326, 11.7001667673))
            ThreePointArc((6.7550944326, 11.7001667673), (0, 13.5101888653), (-6.7550944326, 11.7001667673))
            Line((-6.7550944326, 11.7001667673), (-5.55625, 9.6237072996))
            ThreePointArc((-5.55625, 9.6237072996), (0, 11.1125), (5.55625, 9.6237072996))
        make_face()
        with BuildLine():
            ThreePointArc((6.5913949516, 8.9465730222), (7.4222524621, 9.8235176062), (8.2740561267, 10.6801310099))
            ThreePointArc((8.2740561267, 10.6801310099), (7.5318629748, 11.2158924436), (6.7550944326, 11.7001667673))
            Line((6.7550944326, 11.7001667673), (5.55625, 9.6237072996))
            ThreePointArc((5.55625, 9.6237072996), (6.0832513654, 9.2995542407), (6.5913949516, 8.9465730222))
        make_face()
        with BuildLine():
            Line((11.1125, 0), (13.5101888653, 0))
            ThreePointArc((13.5101888653, 0), (12.1307308957, 5.9473162949), (8.2740561267, 10.6801310099))
            ThreePointArc((8.2740561267, 10.6801310099), (7.4222524621, 9.8235176062), (6.5913949516, 8.9465730222))
            ThreePointArc((6.5913949516, 8.9465730222), (9.9180273404, 5.0120245336), (11.1125, 0))
        make_face()
        with BuildLine():
            ThreePointArc((11.7001667673, -6.7550944326), (13.049840343, -3.4966941813), (13.5101888653, 0))
            Line((13.5101888653, 0), (11.1125, 0))
            ThreePointArc((11.1125, 0), (10.7338507446, -2.8761266387), (9.6237072996, -5.55625))
            Line((9.6237072996, -5.55625), (11.7001667673, -6.7550944326))
        make_face()
        with BuildLine():
            ThreePointArc((5.112236707, -12.505608303), (5.9473162949, -12.1307308957), (6.7550944326, -11.7001667673))
            Line((6.7550944326, -11.7001667673), (5.55625, -9.6237072996))
            ThreePointArc((5.55625, -9.6237072996), (5.0120245336, -9.9180273404), (4.4522620383, -10.1816019856))
            ThreePointArc((4.4522620383, -10.1816019856), (4.7962895705, -11.3396179886), (5.112236707, -12.505608303))
        make_face()
        with BuildLine():
            Line((5.55625, -9.6237072996), (6.7550944326, -11.7001667673))
            ThreePointArc((6.7550944326, -11.7001667673), (9.5531461618, -9.5531461618), (11.7001667673, -6.7550944326))
            Line((11.7001667673, -6.7550944326), (9.6237072996, -5.55625))
            ThreePointArc((9.6237072996, -5.55625), (7.8577241059, -7.8577241059), (5.55625, -9.6237072996))
        make_face()
        with BuildLine():
            ThreePointArc((-6.7550944326, -11.7001667673), (-0.9148384522, -13.4791792696), (5.112236707, -12.505608303))
            ThreePointArc((5.112236707, -12.505608303), (4.7962895705, -11.3396179886), (4.4522620383, -10.1816019856))
            ThreePointArc((4.4522620383, -10.1816019856), (-0.6184730997, -11.095275899), (-5.55625, -9.6237072996))
            Line((-5.55625, -9.6237072996), (-6.7550944326, -11.7001667673))
        make_face()
        with BuildLine():
            ThreePointArc((-11.7001667673, -6.7550944326), (-9.5531461618, -9.5531461618), (-6.7550944326, -11.7001667673))
            Line((-6.7550944326, -11.7001667673), (-5.55625, -9.6237072996))
            ThreePointArc((-5.55625, -9.6237072996), (-7.8577241059, -7.8577241059), (-9.6237072996, -5.55625))
            Line((-9.6237072996, -5.55625), (-11.7001667673, -6.7550944326))
        make_face()
    extrude(amount=F4_DEPTH)


solid = Compound([f1.part, f4.part])
